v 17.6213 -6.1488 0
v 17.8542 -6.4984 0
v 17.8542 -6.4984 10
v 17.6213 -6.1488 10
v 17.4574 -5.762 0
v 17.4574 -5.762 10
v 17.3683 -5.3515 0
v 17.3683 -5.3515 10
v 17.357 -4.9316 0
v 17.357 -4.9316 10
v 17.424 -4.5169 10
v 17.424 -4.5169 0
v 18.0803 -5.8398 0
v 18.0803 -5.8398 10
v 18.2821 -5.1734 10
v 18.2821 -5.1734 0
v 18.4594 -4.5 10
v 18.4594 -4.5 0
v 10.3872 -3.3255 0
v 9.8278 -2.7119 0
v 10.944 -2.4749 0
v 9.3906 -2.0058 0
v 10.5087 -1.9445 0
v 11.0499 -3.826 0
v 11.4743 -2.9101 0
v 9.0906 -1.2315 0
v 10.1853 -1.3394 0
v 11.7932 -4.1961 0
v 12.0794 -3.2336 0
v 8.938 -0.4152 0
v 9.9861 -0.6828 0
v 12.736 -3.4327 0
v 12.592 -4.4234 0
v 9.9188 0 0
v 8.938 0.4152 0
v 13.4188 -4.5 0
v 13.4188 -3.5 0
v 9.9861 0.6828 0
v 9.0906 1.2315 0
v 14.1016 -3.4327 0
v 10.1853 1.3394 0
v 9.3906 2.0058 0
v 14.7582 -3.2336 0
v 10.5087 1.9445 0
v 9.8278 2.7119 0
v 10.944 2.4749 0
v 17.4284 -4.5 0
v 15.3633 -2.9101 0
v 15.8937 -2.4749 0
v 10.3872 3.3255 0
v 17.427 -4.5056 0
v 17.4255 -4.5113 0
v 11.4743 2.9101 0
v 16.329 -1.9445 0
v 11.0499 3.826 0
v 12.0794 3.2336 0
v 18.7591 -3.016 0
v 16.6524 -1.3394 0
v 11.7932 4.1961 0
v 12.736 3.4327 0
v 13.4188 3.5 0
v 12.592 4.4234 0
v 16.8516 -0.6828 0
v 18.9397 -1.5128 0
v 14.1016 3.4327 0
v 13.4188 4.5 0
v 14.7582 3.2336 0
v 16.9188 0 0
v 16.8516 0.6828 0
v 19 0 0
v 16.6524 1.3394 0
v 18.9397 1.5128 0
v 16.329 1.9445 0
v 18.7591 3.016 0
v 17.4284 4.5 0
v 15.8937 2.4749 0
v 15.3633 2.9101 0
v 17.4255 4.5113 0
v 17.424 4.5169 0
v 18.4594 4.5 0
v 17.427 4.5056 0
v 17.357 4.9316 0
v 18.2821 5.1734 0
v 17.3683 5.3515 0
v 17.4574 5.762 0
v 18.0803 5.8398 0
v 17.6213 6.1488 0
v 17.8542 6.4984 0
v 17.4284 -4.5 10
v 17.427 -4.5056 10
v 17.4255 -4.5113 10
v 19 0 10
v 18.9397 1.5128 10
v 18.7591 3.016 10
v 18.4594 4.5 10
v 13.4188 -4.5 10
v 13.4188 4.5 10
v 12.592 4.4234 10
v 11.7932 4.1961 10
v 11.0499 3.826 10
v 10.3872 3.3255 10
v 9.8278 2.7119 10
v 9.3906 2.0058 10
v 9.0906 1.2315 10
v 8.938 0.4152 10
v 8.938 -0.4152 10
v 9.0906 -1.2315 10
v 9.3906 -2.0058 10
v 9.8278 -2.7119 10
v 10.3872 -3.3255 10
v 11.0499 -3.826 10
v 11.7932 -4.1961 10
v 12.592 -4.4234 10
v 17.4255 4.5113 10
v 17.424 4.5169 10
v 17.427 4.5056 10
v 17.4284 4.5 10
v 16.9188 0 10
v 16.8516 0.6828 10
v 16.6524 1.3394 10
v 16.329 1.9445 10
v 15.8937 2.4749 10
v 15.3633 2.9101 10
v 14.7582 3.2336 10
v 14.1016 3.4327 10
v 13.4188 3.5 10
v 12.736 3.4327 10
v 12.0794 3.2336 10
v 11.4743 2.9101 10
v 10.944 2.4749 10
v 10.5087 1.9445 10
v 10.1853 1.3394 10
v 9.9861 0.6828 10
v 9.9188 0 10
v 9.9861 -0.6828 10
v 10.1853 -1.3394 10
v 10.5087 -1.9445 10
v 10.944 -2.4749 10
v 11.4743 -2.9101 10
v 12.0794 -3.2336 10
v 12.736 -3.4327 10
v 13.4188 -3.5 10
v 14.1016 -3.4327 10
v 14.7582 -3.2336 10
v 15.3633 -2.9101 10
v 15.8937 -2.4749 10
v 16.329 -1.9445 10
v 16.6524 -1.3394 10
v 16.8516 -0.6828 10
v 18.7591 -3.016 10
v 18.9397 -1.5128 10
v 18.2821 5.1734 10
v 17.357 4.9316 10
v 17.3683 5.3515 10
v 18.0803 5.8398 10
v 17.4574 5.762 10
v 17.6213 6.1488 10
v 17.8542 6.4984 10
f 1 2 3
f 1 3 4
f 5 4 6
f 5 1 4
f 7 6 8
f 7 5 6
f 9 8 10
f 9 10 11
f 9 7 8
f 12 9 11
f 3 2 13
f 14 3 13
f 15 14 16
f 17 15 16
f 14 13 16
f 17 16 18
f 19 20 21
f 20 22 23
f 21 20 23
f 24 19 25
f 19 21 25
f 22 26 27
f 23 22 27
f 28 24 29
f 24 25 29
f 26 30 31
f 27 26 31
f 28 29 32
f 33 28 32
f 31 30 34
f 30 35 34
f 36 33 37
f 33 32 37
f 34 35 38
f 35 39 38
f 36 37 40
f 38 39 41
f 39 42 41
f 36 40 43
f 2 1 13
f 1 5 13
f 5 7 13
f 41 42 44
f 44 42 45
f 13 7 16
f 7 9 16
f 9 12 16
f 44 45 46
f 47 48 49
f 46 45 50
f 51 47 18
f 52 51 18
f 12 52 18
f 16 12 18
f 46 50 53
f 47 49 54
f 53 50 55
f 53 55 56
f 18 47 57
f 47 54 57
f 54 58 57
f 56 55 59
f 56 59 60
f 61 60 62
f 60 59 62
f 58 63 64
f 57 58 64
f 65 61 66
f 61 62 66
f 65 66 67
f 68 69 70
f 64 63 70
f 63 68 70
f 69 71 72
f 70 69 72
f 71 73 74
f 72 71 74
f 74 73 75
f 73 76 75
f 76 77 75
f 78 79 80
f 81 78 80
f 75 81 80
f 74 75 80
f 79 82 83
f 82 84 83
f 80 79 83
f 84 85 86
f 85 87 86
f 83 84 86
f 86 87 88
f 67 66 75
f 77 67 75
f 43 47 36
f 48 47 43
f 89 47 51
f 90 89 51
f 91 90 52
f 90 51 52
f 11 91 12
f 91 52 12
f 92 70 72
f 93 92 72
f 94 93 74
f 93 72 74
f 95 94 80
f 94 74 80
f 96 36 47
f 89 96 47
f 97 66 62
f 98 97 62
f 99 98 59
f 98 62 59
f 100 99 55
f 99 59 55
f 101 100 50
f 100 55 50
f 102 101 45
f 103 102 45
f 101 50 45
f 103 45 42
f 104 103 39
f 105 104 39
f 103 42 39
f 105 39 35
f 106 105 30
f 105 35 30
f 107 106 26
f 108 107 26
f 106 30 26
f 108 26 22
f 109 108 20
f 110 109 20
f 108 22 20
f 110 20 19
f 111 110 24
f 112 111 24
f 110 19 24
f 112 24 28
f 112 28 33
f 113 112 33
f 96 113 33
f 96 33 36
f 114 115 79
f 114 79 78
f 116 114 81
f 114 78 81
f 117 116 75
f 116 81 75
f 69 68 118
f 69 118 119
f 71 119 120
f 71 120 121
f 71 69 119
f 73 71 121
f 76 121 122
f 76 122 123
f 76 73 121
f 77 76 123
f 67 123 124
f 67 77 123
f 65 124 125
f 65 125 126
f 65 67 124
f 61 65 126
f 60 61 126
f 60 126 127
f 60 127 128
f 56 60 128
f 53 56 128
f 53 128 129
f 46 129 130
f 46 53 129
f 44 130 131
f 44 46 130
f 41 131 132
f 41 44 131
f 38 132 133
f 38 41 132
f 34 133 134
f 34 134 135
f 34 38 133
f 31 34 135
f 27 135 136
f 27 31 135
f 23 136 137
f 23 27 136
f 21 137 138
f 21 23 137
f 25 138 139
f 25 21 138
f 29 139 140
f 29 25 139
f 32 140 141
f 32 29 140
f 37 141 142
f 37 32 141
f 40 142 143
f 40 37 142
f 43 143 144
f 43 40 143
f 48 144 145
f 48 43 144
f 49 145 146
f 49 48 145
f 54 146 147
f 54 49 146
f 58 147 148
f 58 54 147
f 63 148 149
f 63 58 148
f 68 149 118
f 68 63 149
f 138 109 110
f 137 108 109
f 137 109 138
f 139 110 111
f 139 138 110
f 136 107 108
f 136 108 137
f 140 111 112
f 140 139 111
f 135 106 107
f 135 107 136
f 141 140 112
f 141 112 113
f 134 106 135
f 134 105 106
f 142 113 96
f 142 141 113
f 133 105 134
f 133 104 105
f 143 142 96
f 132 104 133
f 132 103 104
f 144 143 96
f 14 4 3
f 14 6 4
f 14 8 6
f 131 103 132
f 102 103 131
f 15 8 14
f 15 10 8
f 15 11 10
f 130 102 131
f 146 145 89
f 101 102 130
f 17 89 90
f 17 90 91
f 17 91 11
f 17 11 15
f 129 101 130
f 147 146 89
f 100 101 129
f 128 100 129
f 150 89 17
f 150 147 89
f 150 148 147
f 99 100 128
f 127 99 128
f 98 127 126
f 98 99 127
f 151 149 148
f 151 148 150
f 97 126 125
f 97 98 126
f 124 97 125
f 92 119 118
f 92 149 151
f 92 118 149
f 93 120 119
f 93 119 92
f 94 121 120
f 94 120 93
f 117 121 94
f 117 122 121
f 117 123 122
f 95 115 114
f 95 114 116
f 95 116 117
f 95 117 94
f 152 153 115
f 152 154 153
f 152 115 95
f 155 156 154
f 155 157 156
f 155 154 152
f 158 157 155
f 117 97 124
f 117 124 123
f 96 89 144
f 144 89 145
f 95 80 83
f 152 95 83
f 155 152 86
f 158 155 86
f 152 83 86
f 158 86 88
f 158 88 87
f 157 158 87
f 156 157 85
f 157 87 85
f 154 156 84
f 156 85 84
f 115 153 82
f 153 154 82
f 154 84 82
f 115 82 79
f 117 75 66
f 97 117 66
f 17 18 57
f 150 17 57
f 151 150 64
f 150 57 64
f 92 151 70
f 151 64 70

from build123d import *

# Parameters (mm, degrees)
F0_R        = 3.5
F1_DEPTH    = 10
F2_T1_DEPTH = 18.5839507528
F2_T3_DEPTH = 18.5839507528


# Not quite as in the source:
# - a fillet or chamfer that OpenCascade refuses, or shapes differently, is made with other operations: its cross-section is extruded or revolved along the edge and cut away or added


with BuildPart() as f1:
    # F0 (on Top) → F1 (new body)
    with BuildSketch(Plane.XY):
        with BuildLine():
            Line((17.4284250579, 4.5), (18.459414942, 4.5))
            ThreePointArc((18.459414942, 4.5), (18.1842599773, 5.507512059), (17.8541597949, 6.4983827232))
            Line((17.8541597949, 6.4983827232), (16.9144671741, 6.1563625799))
            ThreePointArc((16.9144671741, 6.1563625799), (17.191406166, 5.3343747558), (17.4284250579, 4.5))
        make_face()
        with BuildLine():
            ThreePointArc((17.8541597949, -6.4983827232), (18.1842599773, -5.507512059), (18.459414942, -4.5))
            Line((18.459414942, -4.5), (17.4284250579, -4.5))
            ThreePointArc((17.4284250579, -4.5), (17.191406166, -5.3343747558), (16.9144671741, -6.1563625799))
            Line((16.9144671741, -6.1563625799), (17.8541597949, -6.4983827232))
        make_face()
        with BuildLine():
            ThreePointArc((18.459414942, -4.5), (18.8643696409, -2.2661769682), (19, 0))
            ThreePointArc((19, 0), (18.8643696409, 2.2661769682), (18.459414942, 4.5))
            Line((18.459414942, 4.5), (17.4284250579, 4.5))
            ThreePointArc((17.4284250579, 4.5), (17.8565345328, 2.2680772647), (18, 0))
            ThreePointArc((18, 0), (17.8565345328, -2.2680772647), (17.4284250579, -4.5))
            Line((17.4284250579, -4.5), (18.459414942, -4.5))
        make_face()
        with BuildLine():
            ThreePointArc((18, 0), (17.8565345328, 2.2680772647), (17.4284250579, 4.5))
            Line((17.4284250579, 4.5), (13.4188298839, 4.5))
            ThreePointArc((13.4188298839, 4.5), (16.6008103993, 3.1819805153), (17.9188298839, 0))
            ThreePointArc((17.9188298839, 0), (16.6008103993, -3.1819805153), (13.4188298839, -4.5))
            Line((13.4188298839, -4.5), (17.4284250579, -4.5))
            ThreePointArc((17.4284250579, -4.5), (17.8565345328, -2.2680772647), (18, 0))
        make_face()
        with BuildLine():
            ThreePointArc((17.9188298839, 0), (16.6008103993, 3.1819805153), (13.4188298839, 4.5))
            ThreePointArc((13.4188298839, 4.5), (8.9188298839, 0), (13.4188298839, -4.5))
            ThreePointArc((13.4188298839, -4.5), (16.6008103993, -3.1819805153), (17.9188298839, 0))
        make_face()
        with Locations((13.4188298839, 0)):
            Circle(F0_R, mode=Mode.SUBTRACT)
    extrude(amount=F1_DEPTH)

    # F2: fillet of radius 2.25 on 2 edges, made by hand

    # F2_s2 → F2_t1 (cut)
    with BuildSketch(Plane.XY.offset(-4.2919753764)):
        with BuildLine():
            ThreePointArc((17.8541597949, 6.4983827232), (17.4032553622, 5.5588577913), (17.4240420287, 4.5169413745))
            ThreePointArc((17.4240420287, 4.5169413745), (17.1888111585, 5.342730665), (16.9144671741, 6.1563625799))
            Line((16.9144671741, 6.1563625799), (17.8541597949, 6.4983827232))
        make_face()
    extrude(amount=F2_T1_DEPTH, mode=Mode.SUBTRACT)

    # F2_s4 → F2_t3 (cut)
    with BuildSketch(Plane.XY.offset(-4.2919753764)):
        with BuildLine():
            ThreePointArc((17.8541597949, -6.4983827232), (17.4032553622, -5.5588577913), (17.4240420287, -4.5169413745))
            ThreePointArc((17.4240420287, -4.5169413745), (17.1888111585, -5.342730665), (16.9144671741, -6.1563625799))
            Line((16.9144671741, -6.1563625799), (17.8541597949, -6.4983827232))
        make_face()
    extrude(amount=F2_T3_DEPTH, mode=Mode.SUBTRACT)


solid = f1.part
